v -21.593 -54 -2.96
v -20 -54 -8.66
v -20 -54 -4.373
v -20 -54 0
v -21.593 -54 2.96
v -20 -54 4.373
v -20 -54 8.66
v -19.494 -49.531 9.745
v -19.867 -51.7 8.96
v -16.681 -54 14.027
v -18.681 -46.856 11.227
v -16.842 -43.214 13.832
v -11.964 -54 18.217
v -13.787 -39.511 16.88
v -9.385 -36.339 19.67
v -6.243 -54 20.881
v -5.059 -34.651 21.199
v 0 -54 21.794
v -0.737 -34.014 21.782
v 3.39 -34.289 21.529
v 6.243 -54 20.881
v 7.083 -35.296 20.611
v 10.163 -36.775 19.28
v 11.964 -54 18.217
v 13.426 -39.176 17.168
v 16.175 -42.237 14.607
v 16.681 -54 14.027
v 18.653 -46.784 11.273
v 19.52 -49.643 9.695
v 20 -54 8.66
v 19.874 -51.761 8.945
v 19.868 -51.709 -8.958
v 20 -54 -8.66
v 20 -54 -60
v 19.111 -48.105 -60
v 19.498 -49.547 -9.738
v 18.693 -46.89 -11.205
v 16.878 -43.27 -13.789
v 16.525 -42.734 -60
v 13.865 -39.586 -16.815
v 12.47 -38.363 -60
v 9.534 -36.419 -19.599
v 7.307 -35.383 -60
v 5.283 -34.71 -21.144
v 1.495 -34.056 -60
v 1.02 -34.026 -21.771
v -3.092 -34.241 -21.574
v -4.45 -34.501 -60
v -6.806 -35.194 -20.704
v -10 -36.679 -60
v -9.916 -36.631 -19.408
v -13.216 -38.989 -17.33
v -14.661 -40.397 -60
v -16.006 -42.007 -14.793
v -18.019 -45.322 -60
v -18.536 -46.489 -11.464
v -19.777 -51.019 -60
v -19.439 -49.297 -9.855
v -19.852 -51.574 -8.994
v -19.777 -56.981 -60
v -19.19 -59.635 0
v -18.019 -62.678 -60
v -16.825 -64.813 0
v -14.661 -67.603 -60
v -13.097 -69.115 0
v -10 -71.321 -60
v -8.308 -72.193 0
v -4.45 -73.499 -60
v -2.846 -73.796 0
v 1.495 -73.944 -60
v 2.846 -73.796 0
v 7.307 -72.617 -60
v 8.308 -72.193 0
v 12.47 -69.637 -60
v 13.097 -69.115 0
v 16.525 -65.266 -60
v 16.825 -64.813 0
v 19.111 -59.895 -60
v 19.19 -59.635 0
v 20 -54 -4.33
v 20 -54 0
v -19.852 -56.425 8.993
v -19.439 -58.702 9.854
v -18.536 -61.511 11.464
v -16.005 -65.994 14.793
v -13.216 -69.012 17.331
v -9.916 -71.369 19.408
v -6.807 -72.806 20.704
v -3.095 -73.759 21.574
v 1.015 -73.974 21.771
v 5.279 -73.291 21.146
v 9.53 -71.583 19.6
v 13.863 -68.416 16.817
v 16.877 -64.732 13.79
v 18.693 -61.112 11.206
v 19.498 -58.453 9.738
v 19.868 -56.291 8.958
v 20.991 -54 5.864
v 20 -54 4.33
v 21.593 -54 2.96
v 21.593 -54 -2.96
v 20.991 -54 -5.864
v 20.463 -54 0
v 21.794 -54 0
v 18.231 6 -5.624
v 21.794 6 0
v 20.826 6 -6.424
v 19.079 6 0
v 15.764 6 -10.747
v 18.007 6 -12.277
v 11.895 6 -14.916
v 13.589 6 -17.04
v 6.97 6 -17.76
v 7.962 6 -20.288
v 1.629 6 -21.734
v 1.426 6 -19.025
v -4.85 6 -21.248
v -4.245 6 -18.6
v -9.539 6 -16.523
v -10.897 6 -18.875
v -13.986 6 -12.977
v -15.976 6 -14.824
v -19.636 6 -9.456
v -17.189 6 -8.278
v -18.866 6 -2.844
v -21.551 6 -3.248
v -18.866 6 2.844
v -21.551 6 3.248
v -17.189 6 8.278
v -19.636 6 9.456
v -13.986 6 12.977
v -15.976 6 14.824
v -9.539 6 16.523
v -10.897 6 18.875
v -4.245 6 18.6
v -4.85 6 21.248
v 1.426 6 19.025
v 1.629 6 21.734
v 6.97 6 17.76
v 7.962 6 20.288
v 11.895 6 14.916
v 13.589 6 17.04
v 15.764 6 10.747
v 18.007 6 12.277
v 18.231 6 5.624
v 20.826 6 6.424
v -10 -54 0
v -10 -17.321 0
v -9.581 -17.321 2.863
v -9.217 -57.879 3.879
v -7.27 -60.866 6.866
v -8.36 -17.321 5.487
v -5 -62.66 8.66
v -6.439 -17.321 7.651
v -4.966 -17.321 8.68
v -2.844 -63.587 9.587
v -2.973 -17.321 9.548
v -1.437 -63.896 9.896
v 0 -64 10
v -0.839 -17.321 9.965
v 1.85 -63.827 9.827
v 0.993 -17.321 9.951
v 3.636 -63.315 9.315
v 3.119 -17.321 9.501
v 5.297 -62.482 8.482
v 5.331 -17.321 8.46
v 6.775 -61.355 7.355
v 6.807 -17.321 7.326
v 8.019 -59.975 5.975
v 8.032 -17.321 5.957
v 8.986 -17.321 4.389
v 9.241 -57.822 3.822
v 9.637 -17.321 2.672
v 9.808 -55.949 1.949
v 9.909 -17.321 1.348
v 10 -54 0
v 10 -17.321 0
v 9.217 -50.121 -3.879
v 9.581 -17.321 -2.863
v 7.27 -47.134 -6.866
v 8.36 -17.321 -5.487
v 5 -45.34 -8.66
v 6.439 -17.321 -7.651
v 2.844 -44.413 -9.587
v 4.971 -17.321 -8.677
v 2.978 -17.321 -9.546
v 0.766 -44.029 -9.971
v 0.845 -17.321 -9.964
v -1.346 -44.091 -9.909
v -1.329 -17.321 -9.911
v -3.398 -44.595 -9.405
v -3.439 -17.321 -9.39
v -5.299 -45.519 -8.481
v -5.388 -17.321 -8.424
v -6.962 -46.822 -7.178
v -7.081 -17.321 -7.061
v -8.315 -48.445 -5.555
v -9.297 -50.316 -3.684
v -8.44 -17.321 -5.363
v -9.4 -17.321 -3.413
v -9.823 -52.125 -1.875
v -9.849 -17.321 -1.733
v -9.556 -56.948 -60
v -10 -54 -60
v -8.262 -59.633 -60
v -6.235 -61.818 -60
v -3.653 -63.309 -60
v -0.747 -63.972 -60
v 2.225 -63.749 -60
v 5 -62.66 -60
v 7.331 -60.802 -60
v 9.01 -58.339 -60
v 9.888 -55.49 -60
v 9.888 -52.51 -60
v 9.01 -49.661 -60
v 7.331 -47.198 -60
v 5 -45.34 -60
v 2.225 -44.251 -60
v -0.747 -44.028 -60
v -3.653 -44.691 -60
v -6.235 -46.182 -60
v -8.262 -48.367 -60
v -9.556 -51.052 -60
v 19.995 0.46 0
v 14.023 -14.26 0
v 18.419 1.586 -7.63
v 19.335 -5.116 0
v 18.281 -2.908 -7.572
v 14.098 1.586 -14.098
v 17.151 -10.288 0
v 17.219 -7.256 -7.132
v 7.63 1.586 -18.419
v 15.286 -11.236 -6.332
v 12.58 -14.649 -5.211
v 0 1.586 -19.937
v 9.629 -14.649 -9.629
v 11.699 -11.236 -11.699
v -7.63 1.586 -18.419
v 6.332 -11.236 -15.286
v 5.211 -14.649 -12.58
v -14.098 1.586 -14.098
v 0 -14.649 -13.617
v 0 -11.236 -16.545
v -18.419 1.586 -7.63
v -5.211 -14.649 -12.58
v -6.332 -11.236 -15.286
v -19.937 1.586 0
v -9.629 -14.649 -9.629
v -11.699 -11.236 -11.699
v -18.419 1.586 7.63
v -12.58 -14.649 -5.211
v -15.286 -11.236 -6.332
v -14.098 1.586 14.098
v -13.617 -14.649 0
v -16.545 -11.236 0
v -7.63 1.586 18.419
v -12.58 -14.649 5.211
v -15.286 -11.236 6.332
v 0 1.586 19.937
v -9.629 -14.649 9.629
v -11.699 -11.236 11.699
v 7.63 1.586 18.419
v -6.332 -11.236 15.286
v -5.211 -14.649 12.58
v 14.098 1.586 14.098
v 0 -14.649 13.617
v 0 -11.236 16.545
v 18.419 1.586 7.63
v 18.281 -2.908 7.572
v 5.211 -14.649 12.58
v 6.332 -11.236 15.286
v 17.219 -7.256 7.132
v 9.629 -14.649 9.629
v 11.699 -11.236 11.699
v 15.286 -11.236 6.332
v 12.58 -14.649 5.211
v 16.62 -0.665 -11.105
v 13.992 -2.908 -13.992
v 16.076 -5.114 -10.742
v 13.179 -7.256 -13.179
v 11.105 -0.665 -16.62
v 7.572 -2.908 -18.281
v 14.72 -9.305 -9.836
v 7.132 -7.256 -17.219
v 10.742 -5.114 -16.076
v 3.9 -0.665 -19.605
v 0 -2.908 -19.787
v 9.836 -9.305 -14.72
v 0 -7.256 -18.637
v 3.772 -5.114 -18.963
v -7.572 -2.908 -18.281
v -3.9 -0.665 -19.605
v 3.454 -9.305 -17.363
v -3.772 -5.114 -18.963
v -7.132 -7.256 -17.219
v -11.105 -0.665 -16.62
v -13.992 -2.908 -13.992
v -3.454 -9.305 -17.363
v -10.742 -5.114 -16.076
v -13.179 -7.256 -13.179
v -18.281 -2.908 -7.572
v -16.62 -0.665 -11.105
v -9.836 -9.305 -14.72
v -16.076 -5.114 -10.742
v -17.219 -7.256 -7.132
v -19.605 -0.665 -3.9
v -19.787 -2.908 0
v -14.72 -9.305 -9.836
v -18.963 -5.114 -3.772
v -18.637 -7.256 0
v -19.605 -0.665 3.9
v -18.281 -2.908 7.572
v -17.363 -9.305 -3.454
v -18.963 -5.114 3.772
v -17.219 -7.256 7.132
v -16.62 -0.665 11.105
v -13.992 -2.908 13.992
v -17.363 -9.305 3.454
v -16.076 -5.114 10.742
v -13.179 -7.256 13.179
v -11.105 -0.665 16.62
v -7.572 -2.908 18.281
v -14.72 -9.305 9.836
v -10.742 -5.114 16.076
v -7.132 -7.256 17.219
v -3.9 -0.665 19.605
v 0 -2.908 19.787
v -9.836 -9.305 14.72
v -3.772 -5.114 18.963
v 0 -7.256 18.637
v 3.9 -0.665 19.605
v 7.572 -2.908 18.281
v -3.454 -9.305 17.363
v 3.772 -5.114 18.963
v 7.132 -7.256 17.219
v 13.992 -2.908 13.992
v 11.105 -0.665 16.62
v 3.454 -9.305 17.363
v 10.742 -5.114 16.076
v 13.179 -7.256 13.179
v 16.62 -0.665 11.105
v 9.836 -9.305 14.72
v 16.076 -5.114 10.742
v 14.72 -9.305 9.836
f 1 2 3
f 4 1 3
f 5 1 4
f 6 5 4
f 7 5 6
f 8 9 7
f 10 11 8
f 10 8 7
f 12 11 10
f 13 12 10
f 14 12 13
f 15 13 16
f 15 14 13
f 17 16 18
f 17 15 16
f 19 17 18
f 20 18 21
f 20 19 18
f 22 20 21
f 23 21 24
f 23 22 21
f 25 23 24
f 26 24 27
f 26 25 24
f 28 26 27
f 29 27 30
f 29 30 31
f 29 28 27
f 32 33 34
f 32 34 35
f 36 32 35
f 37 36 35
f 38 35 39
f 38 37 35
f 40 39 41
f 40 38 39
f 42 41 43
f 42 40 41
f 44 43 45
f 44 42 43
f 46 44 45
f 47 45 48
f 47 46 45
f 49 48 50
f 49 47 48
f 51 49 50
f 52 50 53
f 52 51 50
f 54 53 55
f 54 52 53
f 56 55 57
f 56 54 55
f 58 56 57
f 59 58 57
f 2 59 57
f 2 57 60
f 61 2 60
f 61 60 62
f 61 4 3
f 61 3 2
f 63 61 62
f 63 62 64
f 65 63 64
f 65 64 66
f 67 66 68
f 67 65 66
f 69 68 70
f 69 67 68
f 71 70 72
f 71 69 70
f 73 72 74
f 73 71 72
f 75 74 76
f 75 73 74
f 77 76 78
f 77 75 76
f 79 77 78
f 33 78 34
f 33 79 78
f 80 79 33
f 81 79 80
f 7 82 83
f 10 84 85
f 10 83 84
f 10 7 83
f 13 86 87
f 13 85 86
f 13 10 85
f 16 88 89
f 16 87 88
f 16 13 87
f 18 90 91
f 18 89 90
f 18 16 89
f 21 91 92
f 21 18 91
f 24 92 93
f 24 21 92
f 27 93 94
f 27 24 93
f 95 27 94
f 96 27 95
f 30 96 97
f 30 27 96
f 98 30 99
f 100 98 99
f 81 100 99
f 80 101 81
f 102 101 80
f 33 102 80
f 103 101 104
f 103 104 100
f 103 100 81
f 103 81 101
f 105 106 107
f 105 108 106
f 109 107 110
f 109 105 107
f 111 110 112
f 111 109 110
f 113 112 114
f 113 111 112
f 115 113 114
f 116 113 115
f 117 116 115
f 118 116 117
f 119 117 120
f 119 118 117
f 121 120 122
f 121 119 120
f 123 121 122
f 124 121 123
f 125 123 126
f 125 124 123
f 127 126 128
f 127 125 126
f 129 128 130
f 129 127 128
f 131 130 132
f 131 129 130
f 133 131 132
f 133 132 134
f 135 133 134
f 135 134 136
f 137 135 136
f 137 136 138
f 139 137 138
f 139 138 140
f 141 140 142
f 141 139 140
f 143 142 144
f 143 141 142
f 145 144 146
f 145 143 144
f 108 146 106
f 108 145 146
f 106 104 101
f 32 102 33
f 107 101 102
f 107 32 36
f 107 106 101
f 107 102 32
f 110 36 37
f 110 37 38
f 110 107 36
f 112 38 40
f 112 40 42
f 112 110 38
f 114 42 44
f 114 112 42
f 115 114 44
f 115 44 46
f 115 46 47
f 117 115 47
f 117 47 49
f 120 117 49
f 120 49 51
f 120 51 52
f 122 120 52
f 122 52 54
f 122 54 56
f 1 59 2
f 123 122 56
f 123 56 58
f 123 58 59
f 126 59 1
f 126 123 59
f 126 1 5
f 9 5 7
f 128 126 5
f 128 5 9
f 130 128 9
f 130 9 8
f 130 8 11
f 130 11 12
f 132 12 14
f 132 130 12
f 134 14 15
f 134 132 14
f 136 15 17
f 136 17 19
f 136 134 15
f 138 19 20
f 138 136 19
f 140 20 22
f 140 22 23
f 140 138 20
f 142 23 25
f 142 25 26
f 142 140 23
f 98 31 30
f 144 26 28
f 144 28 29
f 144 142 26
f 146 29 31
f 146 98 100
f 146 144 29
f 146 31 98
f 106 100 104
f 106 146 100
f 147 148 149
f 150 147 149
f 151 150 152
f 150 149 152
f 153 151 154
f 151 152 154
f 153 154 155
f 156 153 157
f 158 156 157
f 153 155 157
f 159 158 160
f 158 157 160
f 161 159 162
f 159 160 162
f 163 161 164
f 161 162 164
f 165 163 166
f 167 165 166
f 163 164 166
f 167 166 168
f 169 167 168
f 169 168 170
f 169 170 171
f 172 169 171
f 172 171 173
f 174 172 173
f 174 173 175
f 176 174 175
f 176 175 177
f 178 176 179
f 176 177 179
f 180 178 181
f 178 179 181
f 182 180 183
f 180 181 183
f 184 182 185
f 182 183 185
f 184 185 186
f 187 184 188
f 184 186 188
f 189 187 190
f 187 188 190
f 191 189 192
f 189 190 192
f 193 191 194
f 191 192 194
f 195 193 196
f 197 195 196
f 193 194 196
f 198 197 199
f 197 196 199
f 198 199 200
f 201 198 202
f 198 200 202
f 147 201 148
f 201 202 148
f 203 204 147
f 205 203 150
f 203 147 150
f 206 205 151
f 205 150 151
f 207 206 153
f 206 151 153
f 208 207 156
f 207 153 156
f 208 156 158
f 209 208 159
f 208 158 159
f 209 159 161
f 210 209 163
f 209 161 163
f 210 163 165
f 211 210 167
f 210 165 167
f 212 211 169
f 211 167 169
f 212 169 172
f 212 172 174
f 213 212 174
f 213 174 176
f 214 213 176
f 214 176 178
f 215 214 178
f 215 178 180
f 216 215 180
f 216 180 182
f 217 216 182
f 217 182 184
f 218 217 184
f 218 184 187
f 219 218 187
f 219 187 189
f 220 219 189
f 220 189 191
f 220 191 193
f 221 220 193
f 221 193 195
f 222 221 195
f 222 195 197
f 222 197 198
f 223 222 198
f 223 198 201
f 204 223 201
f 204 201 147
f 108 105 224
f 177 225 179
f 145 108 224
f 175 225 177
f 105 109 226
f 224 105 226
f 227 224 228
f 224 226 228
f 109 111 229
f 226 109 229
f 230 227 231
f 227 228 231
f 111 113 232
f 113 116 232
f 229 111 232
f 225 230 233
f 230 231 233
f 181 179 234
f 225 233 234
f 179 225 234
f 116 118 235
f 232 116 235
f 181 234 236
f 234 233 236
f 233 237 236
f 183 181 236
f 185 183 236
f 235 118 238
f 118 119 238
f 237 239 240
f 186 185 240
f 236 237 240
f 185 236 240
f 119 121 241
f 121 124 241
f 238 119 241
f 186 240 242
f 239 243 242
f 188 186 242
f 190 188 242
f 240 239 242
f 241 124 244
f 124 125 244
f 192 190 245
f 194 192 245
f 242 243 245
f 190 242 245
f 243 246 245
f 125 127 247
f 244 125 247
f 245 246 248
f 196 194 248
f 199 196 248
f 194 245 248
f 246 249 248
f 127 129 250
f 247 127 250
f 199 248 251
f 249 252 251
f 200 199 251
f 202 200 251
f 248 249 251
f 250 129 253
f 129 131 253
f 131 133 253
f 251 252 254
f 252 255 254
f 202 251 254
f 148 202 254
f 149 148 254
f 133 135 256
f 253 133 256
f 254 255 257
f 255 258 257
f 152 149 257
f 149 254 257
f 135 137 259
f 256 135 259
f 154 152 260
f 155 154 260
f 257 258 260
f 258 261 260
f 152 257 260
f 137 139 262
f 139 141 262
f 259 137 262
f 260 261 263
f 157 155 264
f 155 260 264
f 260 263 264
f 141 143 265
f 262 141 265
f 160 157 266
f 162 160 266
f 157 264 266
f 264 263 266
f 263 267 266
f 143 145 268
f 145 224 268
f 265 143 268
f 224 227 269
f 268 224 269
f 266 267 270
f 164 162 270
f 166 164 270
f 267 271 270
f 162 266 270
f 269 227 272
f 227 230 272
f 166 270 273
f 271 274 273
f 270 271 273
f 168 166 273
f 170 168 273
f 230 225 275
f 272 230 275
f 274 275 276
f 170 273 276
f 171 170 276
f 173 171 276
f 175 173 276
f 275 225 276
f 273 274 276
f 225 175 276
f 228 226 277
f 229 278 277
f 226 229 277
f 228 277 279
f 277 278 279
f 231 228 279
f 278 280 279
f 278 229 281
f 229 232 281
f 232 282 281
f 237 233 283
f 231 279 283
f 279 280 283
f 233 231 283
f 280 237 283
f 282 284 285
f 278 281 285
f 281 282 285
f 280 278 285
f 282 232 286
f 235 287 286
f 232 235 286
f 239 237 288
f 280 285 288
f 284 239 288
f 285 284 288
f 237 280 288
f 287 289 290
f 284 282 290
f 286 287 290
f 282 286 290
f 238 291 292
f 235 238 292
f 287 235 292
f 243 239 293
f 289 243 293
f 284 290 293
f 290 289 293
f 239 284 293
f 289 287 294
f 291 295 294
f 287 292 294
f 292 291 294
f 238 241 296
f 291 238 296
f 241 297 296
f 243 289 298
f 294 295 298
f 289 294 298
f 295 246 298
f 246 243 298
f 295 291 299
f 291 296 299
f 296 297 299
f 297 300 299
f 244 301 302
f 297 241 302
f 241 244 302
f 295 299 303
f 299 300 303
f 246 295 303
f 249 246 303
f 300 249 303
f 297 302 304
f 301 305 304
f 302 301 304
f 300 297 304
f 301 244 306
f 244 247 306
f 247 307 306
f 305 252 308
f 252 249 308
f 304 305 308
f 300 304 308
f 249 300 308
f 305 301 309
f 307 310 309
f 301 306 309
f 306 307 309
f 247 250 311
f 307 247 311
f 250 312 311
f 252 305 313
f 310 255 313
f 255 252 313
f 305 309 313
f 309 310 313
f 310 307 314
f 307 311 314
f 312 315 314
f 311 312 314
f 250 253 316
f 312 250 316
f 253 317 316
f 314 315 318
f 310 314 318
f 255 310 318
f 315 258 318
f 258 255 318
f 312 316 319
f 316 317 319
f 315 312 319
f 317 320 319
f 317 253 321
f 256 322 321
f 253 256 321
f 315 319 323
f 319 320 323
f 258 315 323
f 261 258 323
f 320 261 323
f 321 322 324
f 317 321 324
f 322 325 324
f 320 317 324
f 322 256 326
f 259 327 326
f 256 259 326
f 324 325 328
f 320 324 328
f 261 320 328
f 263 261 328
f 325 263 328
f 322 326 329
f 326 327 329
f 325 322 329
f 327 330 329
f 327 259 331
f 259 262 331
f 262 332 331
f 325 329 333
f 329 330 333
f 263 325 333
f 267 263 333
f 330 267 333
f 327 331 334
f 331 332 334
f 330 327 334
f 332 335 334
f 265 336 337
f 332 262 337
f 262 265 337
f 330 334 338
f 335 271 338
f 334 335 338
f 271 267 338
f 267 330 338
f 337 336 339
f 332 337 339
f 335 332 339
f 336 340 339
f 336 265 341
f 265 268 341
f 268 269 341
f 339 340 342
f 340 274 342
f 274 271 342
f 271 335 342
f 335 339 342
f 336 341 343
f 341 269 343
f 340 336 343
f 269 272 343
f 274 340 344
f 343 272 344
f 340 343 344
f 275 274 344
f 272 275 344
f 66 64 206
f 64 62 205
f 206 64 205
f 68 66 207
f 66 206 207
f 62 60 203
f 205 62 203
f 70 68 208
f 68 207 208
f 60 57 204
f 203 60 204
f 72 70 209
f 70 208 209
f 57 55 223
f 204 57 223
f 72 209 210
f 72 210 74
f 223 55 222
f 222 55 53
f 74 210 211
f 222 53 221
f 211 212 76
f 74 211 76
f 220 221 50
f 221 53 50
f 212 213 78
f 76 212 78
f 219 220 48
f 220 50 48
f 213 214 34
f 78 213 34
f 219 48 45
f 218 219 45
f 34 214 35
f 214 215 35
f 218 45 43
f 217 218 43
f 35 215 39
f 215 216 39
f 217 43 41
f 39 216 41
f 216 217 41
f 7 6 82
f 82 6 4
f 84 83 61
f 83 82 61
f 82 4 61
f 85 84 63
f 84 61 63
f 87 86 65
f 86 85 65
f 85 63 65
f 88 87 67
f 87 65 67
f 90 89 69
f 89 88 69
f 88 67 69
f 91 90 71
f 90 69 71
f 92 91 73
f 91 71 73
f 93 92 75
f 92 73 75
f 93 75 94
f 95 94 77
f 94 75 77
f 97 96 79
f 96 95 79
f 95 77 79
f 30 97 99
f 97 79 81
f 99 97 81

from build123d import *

# Parameters (mm, degrees)
SKETCH_5_R                       = 20
EXTRUDE_1_DEPTH                  = 60
EXTRUDE_1_DIRECTION_2_REACH      = 64.177
EXTRUDE_1_DIRECTION_2_END_RADIUS = 21.794494718
SKETCH_7_R                       = 10


with BuildPart() as part:
    # Sweep 1: sweep along a path in 草图2
    with BuildLine(Plane(origin=(0, 0, 0), x_dir=(1, 0, 0), z_dir=(0, 1, 0))) as sweep_1_path:
        CenterArc((0, 0), 11, 0, 360)
    # 草图1 → Sweep 1 (sweep)
    with BuildSketch(Plane.XY):
        with BuildLine():
            Line((21.794494718, 6), (21.794494718, -54))
            Line((21.794494718, -54), (0, -54))
            Line((0, -54), (0, -20))
            ThreePointArc((0, -20), (16.124515497, -11.832159566), (19.078784028, 6))
            Line((19.078784028, 6), (21.794494718, 6))
        make_face()
    sweep(path=sweep_1_path.line)

    # 草图5 → 凸台-拉伸1 (add)
    with BuildSketch(Plane.XY):
        with Locations((0, -54)):
            Circle(SKETCH_5_R)
    extrude(amount=-EXTRUDE_1_DEPTH)

    # 凸台-拉伸1 direction 2: up to this cylinder (the profile starts inside it)
    extrude_1_direction_2_end = Plane(origin=(0, -54, 0), z_dir=(0, 1, 0)) * Cylinder(EXTRUDE_1_DIRECTION_2_END_RADIUS, 172.942989435, mode=Mode.PRIVATE)
    # 草图5 → 凸台-拉伸1 direction 2 (add, up to the surface)
    with BuildSketch(Plane.XY, mode=Mode.PRIVATE) as extrude_1_direction_2_sk1:
        with Locations((0, -54)):
            Circle(SKETCH_5_R)
    extrude_1_direction_2_tool1 = extrude(extrude_1_direction_2_sk1.sketch, amount=EXTRUDE_1_DIRECTION_2_REACH, mode=Mode.PRIVATE) & extrude_1_direction_2_end
    add(extrude_1_direction_2_tool1.solids().sort_by_distance((0, -54, 0))[0])

    # Sweep 1 2: sweep along a path in 草图6
    with BuildLine(Plane(origin=(0, 0, 0), x_dir=(0, 0, -1), z_dir=(1, 0, 0))) as sweep_1_2_path:
        Line((60, -54), (0, -54))
        Line((0, -54), (0, 6))
    # 草图7 → Sweep 1 2 (sweep, cut)
    with BuildSketch(Plane(origin=(0, 0, -60), x_dir=(-1, 0, 0), z_dir=(0, 0, -1))):
        with Locations((0, -54)):
            Circle(SKETCH_7_R)
    sweep(path=sweep_1_2_path.line, transition=Transition.RIGHT, mode=Mode.SUBTRACT)


solid = part.part
